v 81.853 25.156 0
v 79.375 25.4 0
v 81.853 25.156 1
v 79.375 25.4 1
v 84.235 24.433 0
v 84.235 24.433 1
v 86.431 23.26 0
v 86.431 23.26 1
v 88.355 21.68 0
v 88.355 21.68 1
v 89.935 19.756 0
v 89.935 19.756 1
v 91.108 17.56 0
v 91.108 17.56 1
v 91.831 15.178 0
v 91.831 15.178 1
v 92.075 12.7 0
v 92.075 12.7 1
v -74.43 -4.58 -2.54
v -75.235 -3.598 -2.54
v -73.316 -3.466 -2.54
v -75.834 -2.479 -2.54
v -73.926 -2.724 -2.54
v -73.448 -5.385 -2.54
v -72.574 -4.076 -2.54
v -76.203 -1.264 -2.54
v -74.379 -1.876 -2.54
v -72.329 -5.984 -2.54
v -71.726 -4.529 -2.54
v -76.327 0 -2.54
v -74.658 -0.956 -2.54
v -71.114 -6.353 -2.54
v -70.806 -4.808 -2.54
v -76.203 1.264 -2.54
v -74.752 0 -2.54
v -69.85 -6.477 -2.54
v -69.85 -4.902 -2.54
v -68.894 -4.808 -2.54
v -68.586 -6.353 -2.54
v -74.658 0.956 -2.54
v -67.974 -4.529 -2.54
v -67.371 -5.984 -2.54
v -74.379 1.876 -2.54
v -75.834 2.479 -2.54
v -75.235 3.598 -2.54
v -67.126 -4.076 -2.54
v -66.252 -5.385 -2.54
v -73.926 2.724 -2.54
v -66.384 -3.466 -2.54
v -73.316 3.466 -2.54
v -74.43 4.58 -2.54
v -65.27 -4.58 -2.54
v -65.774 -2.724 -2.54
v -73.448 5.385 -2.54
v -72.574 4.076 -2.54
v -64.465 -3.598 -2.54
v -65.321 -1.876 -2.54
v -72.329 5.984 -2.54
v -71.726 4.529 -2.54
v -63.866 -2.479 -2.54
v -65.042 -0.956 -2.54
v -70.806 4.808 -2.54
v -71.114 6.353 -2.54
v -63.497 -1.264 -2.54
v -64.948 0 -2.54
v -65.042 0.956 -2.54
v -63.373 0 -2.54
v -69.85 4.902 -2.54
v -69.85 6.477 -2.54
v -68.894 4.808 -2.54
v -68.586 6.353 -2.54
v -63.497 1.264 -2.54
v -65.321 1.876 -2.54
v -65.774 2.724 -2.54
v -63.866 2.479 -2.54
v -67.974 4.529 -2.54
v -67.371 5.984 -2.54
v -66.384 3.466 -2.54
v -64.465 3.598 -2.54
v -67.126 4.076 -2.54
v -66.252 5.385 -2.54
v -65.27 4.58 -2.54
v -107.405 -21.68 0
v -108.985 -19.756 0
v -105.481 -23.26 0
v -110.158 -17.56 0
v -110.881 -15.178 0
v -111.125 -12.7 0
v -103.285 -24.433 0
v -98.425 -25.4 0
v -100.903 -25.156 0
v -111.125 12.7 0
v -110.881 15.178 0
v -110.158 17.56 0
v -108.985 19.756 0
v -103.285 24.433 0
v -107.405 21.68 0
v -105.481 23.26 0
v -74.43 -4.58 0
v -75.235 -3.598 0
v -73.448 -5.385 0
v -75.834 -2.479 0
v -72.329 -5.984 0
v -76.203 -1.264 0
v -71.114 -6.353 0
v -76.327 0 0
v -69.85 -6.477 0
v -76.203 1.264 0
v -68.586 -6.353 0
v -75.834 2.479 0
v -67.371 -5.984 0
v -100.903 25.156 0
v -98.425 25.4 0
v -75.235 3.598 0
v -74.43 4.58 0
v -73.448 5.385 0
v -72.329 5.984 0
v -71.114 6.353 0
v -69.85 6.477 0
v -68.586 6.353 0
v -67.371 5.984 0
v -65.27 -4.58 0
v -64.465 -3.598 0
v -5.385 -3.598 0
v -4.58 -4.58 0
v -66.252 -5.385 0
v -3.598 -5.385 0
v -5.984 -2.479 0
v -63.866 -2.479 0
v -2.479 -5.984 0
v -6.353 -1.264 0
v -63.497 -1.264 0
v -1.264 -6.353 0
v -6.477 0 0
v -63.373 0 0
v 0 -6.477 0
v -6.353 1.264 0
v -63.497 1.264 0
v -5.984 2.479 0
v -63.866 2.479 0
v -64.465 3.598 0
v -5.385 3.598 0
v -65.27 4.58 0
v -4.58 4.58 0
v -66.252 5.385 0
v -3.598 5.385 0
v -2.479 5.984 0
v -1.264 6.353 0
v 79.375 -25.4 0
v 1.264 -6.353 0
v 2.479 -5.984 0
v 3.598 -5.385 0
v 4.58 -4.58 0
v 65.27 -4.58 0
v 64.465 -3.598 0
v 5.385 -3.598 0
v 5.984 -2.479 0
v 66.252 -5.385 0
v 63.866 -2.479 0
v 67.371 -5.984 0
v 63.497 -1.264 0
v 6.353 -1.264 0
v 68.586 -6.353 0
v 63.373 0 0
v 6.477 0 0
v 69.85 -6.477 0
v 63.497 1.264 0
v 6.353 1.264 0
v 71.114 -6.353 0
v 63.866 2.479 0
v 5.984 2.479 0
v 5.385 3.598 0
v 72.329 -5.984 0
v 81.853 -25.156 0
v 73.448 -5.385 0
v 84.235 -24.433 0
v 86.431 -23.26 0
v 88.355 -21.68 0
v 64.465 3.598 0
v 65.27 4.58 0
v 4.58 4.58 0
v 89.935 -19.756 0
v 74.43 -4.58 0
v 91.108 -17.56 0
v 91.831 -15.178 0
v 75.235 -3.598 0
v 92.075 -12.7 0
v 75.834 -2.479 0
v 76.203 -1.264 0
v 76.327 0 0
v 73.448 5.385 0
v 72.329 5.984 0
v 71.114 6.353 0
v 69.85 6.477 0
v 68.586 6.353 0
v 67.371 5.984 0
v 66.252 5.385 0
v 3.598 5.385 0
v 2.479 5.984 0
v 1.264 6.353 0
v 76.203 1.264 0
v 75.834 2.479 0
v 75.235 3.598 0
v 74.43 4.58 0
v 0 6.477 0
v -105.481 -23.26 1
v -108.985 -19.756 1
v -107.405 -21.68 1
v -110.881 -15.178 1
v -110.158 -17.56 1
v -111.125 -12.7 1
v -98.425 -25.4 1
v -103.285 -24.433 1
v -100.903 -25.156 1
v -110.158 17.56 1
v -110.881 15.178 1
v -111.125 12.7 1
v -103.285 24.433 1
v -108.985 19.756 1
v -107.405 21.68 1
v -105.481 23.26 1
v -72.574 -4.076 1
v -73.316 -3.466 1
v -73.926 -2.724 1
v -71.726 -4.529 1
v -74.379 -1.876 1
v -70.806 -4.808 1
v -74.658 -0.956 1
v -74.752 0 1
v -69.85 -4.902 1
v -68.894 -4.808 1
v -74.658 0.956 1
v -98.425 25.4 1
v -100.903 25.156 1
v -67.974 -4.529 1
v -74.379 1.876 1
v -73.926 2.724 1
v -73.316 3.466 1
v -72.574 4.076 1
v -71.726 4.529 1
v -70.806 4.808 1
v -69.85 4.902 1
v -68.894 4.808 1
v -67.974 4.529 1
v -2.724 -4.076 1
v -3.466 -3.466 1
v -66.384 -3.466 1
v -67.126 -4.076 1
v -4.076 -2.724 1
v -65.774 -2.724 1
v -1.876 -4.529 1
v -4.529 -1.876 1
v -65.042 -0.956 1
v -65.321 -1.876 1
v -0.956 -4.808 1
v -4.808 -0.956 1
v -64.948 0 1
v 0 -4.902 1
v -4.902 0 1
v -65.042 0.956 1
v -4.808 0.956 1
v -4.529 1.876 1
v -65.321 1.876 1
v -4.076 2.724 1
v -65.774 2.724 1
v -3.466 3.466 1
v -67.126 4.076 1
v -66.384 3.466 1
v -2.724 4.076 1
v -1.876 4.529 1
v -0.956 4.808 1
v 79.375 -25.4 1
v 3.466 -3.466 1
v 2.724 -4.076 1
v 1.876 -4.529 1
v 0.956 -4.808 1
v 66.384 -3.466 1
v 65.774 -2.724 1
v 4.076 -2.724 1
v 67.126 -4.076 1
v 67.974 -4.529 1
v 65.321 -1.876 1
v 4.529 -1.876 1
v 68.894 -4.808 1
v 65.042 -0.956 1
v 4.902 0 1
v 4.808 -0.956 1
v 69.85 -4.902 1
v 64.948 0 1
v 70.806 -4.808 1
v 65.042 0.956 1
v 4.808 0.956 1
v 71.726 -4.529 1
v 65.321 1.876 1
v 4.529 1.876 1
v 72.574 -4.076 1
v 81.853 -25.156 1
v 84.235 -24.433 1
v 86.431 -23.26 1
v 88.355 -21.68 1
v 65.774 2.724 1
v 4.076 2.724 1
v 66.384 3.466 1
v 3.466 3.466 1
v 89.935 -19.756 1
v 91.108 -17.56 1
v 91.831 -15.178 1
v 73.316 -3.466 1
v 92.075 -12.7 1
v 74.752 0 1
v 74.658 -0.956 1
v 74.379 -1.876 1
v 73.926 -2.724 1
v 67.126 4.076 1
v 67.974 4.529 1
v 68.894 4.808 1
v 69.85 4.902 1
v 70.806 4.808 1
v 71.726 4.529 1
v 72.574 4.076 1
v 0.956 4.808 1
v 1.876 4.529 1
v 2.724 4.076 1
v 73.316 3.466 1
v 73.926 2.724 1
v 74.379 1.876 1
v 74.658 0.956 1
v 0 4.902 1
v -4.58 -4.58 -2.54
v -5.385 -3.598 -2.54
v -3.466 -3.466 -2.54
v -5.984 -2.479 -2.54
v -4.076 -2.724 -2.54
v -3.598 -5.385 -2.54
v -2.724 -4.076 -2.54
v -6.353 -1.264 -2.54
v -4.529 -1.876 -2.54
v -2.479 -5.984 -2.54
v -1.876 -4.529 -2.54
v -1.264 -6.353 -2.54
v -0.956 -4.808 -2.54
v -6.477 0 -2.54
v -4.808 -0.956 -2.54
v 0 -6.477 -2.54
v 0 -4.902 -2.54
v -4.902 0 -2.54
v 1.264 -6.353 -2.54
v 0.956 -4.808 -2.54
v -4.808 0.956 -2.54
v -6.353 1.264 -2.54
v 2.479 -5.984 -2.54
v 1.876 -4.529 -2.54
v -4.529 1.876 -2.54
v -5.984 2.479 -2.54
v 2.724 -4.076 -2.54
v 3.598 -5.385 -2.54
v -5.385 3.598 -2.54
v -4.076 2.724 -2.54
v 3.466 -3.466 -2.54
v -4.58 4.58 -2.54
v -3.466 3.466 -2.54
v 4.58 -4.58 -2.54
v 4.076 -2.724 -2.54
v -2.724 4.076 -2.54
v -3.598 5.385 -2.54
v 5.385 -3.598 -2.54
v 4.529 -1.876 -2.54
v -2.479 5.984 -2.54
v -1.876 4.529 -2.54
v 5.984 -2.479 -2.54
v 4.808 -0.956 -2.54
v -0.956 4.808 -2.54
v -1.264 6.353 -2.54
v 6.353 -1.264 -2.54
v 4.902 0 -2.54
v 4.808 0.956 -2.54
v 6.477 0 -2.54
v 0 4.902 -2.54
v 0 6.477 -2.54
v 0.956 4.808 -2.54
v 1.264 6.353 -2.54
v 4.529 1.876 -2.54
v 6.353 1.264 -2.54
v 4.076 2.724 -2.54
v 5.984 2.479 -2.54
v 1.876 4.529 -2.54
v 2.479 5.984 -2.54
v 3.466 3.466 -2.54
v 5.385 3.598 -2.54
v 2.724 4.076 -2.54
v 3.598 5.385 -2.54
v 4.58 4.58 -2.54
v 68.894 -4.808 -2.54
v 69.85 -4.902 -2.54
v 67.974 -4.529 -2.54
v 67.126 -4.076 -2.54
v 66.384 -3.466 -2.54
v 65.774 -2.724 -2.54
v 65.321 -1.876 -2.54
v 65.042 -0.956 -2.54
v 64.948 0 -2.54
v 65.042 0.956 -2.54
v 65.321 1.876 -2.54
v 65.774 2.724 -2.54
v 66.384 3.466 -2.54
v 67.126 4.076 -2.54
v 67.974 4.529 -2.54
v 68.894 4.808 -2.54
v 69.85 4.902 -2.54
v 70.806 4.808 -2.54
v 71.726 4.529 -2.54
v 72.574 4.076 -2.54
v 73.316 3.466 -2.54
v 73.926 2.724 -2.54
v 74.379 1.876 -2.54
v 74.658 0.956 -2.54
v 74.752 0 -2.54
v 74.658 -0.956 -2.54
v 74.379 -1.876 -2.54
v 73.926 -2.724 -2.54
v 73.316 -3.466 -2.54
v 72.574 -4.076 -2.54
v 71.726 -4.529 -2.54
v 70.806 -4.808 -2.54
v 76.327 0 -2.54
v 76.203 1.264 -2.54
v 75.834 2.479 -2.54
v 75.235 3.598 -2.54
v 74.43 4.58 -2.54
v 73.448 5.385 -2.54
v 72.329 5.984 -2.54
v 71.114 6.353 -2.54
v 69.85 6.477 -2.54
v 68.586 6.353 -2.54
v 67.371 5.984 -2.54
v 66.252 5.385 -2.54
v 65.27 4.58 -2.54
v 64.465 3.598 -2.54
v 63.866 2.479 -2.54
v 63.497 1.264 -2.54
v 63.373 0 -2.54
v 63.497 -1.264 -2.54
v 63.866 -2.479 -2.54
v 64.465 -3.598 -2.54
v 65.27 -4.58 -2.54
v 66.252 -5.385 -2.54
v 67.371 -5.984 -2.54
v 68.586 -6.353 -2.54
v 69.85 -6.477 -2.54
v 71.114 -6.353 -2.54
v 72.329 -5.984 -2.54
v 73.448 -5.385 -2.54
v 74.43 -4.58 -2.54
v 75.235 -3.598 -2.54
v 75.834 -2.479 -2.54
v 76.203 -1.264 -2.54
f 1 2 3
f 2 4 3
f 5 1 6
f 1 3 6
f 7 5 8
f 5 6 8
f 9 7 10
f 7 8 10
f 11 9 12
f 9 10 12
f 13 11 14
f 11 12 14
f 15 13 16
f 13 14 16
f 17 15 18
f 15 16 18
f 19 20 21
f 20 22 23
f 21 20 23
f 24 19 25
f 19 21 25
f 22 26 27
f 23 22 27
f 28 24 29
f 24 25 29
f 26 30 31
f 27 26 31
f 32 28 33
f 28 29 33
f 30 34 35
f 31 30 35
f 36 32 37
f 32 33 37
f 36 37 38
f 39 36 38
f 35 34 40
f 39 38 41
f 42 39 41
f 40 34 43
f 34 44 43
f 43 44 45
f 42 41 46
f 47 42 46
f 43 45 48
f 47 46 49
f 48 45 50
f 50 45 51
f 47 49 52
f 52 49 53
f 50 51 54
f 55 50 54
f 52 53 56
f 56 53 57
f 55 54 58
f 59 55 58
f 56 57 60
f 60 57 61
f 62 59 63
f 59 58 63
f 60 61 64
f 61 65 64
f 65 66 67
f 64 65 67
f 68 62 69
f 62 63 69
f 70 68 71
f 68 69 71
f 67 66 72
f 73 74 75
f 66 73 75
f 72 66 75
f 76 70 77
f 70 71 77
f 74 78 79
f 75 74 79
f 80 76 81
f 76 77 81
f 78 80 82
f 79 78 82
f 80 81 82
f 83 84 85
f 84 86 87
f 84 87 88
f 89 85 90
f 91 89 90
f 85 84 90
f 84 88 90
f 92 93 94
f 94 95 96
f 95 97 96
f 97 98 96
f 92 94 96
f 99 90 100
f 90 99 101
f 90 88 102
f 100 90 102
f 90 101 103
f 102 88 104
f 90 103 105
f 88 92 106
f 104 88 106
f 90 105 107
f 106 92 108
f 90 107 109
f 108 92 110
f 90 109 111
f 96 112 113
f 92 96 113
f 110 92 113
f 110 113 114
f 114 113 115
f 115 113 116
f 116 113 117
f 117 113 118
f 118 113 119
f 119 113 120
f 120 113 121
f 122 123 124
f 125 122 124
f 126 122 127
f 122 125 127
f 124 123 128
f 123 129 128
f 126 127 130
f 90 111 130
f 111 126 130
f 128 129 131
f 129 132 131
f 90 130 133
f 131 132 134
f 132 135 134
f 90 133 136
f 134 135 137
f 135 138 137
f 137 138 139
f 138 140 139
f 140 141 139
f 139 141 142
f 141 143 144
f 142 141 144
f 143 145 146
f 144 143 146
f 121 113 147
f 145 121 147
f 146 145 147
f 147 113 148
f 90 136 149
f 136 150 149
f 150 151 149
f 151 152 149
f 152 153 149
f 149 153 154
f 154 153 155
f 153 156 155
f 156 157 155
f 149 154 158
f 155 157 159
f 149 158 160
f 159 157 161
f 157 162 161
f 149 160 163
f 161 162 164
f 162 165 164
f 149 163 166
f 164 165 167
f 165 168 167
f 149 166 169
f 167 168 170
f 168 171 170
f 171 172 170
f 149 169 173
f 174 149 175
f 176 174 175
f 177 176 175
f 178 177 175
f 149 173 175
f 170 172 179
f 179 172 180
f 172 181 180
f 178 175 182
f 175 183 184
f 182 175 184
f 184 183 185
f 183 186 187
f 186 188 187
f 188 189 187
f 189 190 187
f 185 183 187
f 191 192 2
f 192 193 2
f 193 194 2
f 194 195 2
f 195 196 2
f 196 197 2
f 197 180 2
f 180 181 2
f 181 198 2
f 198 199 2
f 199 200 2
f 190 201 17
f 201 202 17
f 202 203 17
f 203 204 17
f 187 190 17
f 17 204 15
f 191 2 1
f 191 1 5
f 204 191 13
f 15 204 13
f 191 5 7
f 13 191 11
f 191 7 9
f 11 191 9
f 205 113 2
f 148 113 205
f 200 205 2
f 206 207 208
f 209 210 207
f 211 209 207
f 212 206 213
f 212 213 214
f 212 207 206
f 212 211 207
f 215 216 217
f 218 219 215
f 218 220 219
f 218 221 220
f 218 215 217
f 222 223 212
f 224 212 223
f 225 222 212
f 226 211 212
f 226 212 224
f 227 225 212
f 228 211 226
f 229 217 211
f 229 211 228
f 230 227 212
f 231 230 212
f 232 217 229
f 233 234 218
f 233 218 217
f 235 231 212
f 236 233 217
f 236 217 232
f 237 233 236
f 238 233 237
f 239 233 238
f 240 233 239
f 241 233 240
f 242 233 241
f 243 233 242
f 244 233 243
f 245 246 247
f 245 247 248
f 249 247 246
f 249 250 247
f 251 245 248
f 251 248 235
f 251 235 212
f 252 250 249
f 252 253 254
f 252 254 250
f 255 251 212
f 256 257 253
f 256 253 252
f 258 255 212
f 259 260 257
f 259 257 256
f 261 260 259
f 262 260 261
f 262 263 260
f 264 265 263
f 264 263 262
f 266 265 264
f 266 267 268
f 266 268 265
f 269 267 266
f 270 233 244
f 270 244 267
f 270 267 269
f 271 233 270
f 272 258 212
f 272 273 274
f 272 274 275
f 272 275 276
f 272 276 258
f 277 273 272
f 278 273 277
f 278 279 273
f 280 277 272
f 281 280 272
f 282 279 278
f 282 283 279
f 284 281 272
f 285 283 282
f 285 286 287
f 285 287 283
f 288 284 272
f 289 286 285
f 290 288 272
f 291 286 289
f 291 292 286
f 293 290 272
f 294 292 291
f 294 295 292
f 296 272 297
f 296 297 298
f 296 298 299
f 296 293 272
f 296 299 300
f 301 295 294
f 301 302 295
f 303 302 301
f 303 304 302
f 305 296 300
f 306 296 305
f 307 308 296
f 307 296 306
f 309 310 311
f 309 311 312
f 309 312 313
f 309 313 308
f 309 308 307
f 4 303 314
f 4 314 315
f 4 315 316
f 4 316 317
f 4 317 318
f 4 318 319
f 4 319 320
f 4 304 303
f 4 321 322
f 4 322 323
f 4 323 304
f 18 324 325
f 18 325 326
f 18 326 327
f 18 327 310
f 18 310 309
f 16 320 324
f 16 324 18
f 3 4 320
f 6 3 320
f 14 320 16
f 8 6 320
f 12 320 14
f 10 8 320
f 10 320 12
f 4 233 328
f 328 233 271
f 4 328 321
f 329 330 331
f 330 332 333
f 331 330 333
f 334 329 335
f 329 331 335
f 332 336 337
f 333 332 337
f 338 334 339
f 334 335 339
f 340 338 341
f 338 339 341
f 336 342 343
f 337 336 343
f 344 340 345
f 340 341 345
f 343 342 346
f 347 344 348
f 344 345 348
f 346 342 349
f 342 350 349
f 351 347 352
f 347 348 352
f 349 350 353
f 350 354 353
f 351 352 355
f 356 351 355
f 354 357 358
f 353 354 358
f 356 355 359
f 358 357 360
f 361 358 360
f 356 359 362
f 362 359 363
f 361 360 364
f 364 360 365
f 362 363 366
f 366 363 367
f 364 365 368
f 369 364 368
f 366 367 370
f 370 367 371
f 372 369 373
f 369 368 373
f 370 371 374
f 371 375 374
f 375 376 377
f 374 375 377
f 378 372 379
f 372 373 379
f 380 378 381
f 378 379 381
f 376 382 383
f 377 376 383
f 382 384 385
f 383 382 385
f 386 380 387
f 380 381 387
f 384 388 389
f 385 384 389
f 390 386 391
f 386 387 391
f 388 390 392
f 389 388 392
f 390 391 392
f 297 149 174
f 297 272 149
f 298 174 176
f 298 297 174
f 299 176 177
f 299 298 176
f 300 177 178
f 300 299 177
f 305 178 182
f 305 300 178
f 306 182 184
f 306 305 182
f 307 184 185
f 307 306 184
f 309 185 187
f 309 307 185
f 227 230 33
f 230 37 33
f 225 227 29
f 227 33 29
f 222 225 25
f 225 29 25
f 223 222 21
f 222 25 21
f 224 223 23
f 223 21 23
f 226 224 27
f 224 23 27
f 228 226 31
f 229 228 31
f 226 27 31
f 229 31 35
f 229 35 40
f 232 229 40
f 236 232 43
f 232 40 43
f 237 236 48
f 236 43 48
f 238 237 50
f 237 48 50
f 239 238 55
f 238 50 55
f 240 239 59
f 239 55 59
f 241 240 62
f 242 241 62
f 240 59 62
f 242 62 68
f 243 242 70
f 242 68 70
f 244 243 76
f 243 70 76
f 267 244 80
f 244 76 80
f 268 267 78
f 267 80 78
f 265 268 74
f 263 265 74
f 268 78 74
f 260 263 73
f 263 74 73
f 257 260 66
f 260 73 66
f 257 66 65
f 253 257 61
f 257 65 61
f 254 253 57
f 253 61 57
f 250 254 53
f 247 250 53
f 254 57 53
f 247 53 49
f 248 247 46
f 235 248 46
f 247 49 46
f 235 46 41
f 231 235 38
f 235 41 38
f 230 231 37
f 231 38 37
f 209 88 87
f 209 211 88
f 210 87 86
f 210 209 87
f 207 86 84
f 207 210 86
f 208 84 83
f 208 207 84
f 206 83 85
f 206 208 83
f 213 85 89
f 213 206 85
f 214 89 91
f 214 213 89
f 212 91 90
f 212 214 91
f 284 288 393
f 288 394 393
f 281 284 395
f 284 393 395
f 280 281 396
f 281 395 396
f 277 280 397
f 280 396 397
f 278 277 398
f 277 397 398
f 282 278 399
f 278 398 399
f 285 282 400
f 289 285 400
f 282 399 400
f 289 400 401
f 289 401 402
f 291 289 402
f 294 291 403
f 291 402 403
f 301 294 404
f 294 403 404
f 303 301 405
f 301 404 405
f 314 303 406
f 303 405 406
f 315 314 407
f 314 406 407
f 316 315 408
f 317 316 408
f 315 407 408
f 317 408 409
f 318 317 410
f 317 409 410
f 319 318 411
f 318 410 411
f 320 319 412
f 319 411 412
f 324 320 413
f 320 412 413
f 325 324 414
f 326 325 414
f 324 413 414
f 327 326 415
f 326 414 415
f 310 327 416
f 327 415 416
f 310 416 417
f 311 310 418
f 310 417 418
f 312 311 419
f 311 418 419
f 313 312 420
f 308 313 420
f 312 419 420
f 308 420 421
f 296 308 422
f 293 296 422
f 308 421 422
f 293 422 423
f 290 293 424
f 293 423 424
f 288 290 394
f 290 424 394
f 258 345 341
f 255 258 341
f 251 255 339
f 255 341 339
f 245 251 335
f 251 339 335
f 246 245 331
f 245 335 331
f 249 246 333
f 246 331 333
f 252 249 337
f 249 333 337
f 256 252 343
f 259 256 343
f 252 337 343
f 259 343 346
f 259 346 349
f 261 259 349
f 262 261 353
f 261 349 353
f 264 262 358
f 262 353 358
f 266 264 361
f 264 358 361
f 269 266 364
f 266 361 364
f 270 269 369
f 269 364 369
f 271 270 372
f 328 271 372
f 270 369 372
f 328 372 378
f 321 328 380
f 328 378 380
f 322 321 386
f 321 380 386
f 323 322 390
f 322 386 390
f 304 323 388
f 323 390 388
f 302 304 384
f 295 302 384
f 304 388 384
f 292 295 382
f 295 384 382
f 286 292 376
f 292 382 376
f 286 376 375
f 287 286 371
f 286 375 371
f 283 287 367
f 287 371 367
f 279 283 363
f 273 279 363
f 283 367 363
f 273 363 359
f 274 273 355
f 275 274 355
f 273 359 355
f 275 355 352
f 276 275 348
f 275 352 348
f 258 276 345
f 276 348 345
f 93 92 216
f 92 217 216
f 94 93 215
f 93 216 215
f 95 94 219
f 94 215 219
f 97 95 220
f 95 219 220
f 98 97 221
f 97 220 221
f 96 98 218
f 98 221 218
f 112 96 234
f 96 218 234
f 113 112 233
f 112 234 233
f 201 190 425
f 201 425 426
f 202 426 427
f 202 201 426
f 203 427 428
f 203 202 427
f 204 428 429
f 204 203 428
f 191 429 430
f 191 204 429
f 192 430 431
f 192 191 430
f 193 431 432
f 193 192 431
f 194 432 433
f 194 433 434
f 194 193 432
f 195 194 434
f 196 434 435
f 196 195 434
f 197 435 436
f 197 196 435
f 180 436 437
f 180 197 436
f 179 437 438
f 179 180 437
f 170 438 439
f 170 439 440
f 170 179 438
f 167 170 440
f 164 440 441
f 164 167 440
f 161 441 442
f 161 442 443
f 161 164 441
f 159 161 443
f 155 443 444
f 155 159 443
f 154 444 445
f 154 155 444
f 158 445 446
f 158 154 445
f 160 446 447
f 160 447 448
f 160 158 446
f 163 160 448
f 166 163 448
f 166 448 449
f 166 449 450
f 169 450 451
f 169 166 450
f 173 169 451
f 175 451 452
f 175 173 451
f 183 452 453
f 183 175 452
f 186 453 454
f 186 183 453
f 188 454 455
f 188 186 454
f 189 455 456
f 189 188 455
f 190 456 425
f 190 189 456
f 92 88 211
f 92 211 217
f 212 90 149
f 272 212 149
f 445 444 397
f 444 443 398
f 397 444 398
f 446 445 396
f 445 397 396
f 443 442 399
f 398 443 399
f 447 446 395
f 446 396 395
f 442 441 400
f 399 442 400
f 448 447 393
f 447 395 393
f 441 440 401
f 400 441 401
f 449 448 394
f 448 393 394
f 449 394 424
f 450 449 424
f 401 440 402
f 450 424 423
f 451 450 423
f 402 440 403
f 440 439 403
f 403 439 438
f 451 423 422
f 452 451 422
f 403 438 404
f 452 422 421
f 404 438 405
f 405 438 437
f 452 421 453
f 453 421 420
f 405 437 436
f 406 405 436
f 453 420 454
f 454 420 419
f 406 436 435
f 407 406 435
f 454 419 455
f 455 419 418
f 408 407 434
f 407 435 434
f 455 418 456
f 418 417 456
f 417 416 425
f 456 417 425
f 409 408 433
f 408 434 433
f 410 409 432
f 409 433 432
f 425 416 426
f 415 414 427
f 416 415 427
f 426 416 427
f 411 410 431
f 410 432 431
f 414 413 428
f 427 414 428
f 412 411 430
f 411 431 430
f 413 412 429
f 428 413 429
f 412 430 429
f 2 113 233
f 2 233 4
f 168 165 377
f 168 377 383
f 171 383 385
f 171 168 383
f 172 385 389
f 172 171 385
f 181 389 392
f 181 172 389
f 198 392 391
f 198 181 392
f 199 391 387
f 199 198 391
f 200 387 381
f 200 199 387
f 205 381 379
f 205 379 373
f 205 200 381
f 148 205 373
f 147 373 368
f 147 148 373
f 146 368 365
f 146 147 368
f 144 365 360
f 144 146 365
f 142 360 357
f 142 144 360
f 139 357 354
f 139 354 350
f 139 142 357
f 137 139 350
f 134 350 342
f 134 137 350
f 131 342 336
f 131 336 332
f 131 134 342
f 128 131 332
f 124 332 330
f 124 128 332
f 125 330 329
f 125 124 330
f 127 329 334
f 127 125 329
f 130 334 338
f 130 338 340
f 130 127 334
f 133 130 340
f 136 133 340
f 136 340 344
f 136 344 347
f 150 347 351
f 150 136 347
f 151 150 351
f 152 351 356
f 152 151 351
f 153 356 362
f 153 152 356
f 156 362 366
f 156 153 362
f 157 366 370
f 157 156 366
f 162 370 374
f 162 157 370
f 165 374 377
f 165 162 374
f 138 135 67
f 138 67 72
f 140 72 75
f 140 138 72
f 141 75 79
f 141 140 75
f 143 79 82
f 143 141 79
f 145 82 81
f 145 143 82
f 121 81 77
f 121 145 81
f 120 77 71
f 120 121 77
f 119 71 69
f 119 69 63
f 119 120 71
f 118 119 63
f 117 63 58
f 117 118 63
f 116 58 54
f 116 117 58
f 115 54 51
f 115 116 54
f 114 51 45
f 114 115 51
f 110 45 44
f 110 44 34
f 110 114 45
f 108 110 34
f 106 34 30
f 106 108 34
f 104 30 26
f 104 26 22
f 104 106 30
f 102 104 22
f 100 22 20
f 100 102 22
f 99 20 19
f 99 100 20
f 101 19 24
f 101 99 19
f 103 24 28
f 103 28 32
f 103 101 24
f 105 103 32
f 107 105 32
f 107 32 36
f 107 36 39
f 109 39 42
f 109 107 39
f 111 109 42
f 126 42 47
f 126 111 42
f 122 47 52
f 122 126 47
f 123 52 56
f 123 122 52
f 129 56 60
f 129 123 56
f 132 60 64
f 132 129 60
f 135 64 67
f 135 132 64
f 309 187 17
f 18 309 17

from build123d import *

# Parameters (mm, degrees)
SKETCH1_W                        = 203.2
SKETCH1_H                        = 50.8
BOSS_EXTRUDE1_DEPTH              = 1
SKETCH1_3_R                      = 6.477
BOSS_EXTRUDE2_DEPTH              = 2.54
SKETCH2_W                        = 4.9022
SKETCH2_H                        = 3.54
F_3_8_CLEARANCE_HOLE1_AT_2_COUNT = 2
F_3_8_CLEARANCE_HOLE1_AT_2_PITCH = 69.85
F_3_8_CLEARANCE_HOLE1_AT_3_COUNT = 2
F_3_8_CLEARANCE_HOLE1_AT_3_PITCH = 139.7
F_3_8_CLEARANCE_HOLE1_AT_4_COUNT = 2
F_3_8_CLEARANCE_HOLE1_AT_4_PITCH = 69.85
FILLET1_R                        = 12.7


with BuildPart() as part:
    # Sketch1 → Boss-Extrude1 (new body)
    with BuildSketch(Plane.XY):
        with Locations((-9.525, 0)):
            Rectangle(SKETCH1_W, SKETCH1_H)
    extrude(amount=BOSS_EXTRUDE1_DEPTH)

    # Sketch1<3> → Boss-Extrude2 (add)
    with BuildSketch(Plane.XY):
        with Locations((-69.85, 0)):
            Circle(SKETCH1_3_R)
        Circle(SKETCH1_3_R)
        with Locations((69.85, 0)):
            Circle(SKETCH1_3_R)
    extrude(amount=-BOSS_EXTRUDE2_DEPTH)

    # Sketch2 → 3/8 Clearance Hole1 (revolve, cut)
    with BuildSketch(Plane(origin=(-69.85, 0, 1), x_dir=(0, -1, 0), z_dir=(1, 0, 0))):
        with Locations((2.4511, 1.77)):
            Rectangle(SKETCH2_W, SKETCH2_H)
    f_3_8_clearance_hole1 = revolve(axis=Axis((-69.85, 0, 7.35), (0, 0, -1)), mode=Mode.SUBTRACT)

    # 3/8 Clearance Hole1 at 2: 3/8 Clearance Hole1 ×2
    with Locations(*[(i * F_3_8_CLEARANCE_HOLE1_AT_2_PITCH, 0, 0) for i in range(1, F_3_8_CLEARANCE_HOLE1_AT_2_COUNT)]):
        add(f_3_8_clearance_hole1, mode=Mode.SUBTRACT)

    # 3/8 Clearance Hole1 at 3: 3/8 Clearance Hole1 ×2
    with Locations(*[(i * F_3_8_CLEARANCE_HOLE1_AT_3_PITCH, 0, 0) for i in range(1, F_3_8_CLEARANCE_HOLE1_AT_3_COUNT)]):
        add(f_3_8_clearance_hole1, mode=Mode.SUBTRACT)

    # 3/8 Clearance Hole1 at 4: 3/8 Clearance Hole1 ×2
    with Locations(*[(i * F_3_8_CLEARANCE_HOLE1_AT_4_PITCH, 0, 0) for i in range(1, F_3_8_CLEARANCE_HOLE1_AT_4_COUNT)]):
        add(f_3_8_clearance_hole1, mode=Mode.SUBTRACT)

    # Fillet1
    fillet1_edges = [part.edges().sort_by_distance(p)[0] for p in [
        (92.075, -25.4, 0.5),
        (-111.125, -25.4, 0.5),
        (-111.125, 25.4, 0.5),
        (92.075, 25.4, 0.5),
    ]]
    fillet(fillet1_edges, radius=FILLET1_R)


solid = part.part
